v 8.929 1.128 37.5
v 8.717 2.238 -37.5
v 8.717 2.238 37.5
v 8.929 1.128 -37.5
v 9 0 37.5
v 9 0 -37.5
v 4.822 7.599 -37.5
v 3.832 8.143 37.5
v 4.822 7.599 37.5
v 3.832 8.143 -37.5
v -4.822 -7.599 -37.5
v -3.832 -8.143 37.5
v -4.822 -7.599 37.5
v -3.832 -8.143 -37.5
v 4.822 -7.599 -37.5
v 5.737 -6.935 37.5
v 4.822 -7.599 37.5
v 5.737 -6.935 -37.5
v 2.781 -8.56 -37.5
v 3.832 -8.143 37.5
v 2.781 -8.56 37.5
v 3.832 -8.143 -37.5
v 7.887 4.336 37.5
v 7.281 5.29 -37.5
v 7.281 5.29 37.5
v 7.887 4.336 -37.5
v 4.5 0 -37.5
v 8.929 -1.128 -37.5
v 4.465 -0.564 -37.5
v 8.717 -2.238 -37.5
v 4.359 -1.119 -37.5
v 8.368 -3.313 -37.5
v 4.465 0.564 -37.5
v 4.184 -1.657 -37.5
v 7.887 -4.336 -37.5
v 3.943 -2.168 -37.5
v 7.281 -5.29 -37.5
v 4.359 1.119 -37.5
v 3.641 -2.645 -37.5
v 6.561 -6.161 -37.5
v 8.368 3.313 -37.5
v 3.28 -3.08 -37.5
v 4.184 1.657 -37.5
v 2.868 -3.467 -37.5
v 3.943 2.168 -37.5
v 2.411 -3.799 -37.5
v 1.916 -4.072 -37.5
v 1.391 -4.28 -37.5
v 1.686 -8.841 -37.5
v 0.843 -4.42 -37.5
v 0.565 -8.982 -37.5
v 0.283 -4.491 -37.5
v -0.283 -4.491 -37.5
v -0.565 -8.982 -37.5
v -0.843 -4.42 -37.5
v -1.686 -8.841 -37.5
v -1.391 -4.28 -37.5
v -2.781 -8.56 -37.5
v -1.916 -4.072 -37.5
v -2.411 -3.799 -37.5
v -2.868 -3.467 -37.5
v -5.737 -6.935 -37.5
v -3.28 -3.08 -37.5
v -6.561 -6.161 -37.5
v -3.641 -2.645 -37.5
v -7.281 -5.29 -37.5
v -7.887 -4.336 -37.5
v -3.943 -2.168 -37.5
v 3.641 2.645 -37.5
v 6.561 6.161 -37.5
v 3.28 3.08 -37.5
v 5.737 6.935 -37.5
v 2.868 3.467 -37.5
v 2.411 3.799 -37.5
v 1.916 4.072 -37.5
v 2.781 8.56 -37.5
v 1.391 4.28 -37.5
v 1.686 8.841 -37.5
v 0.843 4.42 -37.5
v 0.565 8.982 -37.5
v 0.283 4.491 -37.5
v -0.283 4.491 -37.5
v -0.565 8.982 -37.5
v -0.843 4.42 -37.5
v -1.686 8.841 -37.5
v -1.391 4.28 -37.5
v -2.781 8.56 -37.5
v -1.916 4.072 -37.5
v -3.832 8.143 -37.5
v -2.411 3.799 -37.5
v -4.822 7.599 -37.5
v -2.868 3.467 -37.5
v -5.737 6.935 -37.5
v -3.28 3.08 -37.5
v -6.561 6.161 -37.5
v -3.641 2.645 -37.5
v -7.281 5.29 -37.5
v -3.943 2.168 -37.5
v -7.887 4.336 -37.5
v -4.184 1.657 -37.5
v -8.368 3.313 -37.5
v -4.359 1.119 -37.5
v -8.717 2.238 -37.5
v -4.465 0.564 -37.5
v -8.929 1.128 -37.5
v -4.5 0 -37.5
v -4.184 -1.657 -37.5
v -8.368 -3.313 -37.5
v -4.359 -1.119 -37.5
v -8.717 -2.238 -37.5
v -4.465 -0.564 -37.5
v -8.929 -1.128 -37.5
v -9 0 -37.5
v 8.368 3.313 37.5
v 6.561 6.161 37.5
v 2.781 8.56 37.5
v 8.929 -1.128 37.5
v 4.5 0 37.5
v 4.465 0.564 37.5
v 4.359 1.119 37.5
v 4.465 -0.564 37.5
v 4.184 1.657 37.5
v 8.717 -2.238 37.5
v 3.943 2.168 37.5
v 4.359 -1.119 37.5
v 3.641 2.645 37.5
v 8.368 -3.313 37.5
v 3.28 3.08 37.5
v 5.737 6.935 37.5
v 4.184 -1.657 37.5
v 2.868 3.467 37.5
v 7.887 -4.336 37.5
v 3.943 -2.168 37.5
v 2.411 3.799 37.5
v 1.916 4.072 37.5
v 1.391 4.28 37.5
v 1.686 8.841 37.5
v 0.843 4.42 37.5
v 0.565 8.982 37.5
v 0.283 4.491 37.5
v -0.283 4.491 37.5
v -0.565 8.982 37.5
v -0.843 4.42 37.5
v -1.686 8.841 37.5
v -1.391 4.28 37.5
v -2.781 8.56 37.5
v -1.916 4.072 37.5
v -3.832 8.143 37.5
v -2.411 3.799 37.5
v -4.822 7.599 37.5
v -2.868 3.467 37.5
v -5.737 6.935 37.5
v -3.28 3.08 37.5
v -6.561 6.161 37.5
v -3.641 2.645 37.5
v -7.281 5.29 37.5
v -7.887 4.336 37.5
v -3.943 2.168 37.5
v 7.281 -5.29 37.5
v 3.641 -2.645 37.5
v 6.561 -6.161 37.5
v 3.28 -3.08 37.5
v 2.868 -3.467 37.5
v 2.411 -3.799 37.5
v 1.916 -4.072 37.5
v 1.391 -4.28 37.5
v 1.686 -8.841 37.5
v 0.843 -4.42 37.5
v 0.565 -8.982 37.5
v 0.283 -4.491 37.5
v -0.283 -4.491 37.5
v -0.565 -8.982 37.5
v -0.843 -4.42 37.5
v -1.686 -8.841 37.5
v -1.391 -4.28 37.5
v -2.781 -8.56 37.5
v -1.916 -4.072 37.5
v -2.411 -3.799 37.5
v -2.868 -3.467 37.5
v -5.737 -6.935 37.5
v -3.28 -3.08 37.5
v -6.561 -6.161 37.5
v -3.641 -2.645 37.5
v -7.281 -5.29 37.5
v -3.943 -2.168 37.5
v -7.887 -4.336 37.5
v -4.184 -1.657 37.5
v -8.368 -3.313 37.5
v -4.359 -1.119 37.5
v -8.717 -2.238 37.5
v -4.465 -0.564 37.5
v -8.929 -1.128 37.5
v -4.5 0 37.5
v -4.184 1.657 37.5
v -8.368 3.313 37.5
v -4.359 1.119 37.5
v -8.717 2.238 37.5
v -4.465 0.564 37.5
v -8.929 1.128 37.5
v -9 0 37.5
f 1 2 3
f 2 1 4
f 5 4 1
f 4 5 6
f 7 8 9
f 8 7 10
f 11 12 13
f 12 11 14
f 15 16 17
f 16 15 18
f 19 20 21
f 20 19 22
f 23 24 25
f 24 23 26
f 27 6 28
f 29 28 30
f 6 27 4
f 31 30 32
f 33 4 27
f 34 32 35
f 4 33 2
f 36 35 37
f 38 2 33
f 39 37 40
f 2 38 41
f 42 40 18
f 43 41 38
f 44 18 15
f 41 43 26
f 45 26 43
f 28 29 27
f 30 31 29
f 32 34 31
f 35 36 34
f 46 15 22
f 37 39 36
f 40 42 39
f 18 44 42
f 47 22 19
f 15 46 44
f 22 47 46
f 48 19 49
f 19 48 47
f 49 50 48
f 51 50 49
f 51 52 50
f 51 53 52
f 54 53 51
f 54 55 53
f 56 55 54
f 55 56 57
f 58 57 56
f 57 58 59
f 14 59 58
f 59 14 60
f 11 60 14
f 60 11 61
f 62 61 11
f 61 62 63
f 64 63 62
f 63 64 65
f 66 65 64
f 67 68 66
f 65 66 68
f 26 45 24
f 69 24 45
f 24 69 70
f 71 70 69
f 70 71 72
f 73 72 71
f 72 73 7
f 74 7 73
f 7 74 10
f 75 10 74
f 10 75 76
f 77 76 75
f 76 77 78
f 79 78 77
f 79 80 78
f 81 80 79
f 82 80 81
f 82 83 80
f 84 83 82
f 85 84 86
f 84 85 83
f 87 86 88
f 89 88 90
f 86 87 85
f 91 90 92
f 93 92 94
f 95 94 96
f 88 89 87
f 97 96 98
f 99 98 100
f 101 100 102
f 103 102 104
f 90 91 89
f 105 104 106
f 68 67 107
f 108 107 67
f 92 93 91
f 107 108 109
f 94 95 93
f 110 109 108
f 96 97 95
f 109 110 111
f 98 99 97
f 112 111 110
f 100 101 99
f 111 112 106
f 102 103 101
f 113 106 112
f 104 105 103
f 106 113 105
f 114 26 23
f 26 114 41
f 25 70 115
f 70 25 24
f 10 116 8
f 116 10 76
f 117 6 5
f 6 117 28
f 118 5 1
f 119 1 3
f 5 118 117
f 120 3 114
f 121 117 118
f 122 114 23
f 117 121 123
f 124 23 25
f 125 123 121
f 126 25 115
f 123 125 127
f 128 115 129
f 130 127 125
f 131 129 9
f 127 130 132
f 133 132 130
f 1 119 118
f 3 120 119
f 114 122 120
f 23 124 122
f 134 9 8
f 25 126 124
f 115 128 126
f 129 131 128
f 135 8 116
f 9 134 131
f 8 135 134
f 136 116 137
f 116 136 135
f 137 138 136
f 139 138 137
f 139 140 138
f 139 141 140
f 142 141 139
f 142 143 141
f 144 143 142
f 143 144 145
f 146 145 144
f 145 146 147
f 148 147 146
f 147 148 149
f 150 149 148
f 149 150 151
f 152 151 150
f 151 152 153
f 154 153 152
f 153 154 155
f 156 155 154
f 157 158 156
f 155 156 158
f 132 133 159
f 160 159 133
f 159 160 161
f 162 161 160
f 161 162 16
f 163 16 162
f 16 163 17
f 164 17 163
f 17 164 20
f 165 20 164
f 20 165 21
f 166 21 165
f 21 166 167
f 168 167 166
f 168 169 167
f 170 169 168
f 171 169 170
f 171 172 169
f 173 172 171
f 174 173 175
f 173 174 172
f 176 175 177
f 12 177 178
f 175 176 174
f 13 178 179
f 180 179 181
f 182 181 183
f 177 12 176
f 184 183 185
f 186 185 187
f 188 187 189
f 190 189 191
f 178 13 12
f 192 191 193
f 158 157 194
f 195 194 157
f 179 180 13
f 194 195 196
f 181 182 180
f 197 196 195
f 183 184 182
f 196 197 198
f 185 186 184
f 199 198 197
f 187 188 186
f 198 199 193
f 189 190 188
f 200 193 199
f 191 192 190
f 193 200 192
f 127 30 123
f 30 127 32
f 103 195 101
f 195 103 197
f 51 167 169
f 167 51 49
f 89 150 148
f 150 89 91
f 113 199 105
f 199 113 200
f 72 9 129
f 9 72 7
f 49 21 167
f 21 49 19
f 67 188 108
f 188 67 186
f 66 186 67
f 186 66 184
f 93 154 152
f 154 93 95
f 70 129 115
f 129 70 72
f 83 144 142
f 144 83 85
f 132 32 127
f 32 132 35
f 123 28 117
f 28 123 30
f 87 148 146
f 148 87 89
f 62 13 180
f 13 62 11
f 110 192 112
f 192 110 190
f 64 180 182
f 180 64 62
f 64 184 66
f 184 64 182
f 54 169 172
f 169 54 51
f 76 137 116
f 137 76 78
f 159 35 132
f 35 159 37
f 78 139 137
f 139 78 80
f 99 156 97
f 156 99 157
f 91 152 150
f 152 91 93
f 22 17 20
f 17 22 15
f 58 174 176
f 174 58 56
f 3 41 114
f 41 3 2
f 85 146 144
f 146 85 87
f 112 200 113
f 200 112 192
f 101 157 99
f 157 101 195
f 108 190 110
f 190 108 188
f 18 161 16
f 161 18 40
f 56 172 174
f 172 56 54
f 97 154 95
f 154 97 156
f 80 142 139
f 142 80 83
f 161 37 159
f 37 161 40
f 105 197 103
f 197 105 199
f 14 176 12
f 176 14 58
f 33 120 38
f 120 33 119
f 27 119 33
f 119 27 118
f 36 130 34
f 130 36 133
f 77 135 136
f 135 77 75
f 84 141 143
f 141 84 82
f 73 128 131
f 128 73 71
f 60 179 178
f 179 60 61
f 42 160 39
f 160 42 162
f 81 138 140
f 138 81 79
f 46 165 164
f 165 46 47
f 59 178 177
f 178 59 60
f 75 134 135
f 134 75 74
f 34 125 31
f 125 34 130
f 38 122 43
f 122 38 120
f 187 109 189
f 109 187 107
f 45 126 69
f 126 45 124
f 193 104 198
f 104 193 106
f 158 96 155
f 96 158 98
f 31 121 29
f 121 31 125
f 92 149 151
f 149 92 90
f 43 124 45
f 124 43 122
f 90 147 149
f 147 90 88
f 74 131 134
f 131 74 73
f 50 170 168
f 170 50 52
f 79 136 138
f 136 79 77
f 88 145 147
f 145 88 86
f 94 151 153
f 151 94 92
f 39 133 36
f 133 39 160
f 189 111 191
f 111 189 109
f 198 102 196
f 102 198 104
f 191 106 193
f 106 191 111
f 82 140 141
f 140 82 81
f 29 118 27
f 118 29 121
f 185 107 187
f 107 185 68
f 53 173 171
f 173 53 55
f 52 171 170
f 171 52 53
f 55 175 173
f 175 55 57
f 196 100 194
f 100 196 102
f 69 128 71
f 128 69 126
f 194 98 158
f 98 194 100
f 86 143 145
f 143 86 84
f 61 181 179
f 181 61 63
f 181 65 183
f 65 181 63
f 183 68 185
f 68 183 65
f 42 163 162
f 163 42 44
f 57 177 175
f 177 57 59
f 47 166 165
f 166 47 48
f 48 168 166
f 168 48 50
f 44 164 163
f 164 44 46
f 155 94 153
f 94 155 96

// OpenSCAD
$fn = 50;


difference() {
	union() {
		translate(v = [0, 0, -37.5000000000]) {
			cylinder(h = 75, r = 9.0000000000);
		}
	}
	union() {
		translate(v = [0, 0, -100.0000000000]) {
			cylinder(h = 200, r = 4.5000000000);
		}
	}
}
